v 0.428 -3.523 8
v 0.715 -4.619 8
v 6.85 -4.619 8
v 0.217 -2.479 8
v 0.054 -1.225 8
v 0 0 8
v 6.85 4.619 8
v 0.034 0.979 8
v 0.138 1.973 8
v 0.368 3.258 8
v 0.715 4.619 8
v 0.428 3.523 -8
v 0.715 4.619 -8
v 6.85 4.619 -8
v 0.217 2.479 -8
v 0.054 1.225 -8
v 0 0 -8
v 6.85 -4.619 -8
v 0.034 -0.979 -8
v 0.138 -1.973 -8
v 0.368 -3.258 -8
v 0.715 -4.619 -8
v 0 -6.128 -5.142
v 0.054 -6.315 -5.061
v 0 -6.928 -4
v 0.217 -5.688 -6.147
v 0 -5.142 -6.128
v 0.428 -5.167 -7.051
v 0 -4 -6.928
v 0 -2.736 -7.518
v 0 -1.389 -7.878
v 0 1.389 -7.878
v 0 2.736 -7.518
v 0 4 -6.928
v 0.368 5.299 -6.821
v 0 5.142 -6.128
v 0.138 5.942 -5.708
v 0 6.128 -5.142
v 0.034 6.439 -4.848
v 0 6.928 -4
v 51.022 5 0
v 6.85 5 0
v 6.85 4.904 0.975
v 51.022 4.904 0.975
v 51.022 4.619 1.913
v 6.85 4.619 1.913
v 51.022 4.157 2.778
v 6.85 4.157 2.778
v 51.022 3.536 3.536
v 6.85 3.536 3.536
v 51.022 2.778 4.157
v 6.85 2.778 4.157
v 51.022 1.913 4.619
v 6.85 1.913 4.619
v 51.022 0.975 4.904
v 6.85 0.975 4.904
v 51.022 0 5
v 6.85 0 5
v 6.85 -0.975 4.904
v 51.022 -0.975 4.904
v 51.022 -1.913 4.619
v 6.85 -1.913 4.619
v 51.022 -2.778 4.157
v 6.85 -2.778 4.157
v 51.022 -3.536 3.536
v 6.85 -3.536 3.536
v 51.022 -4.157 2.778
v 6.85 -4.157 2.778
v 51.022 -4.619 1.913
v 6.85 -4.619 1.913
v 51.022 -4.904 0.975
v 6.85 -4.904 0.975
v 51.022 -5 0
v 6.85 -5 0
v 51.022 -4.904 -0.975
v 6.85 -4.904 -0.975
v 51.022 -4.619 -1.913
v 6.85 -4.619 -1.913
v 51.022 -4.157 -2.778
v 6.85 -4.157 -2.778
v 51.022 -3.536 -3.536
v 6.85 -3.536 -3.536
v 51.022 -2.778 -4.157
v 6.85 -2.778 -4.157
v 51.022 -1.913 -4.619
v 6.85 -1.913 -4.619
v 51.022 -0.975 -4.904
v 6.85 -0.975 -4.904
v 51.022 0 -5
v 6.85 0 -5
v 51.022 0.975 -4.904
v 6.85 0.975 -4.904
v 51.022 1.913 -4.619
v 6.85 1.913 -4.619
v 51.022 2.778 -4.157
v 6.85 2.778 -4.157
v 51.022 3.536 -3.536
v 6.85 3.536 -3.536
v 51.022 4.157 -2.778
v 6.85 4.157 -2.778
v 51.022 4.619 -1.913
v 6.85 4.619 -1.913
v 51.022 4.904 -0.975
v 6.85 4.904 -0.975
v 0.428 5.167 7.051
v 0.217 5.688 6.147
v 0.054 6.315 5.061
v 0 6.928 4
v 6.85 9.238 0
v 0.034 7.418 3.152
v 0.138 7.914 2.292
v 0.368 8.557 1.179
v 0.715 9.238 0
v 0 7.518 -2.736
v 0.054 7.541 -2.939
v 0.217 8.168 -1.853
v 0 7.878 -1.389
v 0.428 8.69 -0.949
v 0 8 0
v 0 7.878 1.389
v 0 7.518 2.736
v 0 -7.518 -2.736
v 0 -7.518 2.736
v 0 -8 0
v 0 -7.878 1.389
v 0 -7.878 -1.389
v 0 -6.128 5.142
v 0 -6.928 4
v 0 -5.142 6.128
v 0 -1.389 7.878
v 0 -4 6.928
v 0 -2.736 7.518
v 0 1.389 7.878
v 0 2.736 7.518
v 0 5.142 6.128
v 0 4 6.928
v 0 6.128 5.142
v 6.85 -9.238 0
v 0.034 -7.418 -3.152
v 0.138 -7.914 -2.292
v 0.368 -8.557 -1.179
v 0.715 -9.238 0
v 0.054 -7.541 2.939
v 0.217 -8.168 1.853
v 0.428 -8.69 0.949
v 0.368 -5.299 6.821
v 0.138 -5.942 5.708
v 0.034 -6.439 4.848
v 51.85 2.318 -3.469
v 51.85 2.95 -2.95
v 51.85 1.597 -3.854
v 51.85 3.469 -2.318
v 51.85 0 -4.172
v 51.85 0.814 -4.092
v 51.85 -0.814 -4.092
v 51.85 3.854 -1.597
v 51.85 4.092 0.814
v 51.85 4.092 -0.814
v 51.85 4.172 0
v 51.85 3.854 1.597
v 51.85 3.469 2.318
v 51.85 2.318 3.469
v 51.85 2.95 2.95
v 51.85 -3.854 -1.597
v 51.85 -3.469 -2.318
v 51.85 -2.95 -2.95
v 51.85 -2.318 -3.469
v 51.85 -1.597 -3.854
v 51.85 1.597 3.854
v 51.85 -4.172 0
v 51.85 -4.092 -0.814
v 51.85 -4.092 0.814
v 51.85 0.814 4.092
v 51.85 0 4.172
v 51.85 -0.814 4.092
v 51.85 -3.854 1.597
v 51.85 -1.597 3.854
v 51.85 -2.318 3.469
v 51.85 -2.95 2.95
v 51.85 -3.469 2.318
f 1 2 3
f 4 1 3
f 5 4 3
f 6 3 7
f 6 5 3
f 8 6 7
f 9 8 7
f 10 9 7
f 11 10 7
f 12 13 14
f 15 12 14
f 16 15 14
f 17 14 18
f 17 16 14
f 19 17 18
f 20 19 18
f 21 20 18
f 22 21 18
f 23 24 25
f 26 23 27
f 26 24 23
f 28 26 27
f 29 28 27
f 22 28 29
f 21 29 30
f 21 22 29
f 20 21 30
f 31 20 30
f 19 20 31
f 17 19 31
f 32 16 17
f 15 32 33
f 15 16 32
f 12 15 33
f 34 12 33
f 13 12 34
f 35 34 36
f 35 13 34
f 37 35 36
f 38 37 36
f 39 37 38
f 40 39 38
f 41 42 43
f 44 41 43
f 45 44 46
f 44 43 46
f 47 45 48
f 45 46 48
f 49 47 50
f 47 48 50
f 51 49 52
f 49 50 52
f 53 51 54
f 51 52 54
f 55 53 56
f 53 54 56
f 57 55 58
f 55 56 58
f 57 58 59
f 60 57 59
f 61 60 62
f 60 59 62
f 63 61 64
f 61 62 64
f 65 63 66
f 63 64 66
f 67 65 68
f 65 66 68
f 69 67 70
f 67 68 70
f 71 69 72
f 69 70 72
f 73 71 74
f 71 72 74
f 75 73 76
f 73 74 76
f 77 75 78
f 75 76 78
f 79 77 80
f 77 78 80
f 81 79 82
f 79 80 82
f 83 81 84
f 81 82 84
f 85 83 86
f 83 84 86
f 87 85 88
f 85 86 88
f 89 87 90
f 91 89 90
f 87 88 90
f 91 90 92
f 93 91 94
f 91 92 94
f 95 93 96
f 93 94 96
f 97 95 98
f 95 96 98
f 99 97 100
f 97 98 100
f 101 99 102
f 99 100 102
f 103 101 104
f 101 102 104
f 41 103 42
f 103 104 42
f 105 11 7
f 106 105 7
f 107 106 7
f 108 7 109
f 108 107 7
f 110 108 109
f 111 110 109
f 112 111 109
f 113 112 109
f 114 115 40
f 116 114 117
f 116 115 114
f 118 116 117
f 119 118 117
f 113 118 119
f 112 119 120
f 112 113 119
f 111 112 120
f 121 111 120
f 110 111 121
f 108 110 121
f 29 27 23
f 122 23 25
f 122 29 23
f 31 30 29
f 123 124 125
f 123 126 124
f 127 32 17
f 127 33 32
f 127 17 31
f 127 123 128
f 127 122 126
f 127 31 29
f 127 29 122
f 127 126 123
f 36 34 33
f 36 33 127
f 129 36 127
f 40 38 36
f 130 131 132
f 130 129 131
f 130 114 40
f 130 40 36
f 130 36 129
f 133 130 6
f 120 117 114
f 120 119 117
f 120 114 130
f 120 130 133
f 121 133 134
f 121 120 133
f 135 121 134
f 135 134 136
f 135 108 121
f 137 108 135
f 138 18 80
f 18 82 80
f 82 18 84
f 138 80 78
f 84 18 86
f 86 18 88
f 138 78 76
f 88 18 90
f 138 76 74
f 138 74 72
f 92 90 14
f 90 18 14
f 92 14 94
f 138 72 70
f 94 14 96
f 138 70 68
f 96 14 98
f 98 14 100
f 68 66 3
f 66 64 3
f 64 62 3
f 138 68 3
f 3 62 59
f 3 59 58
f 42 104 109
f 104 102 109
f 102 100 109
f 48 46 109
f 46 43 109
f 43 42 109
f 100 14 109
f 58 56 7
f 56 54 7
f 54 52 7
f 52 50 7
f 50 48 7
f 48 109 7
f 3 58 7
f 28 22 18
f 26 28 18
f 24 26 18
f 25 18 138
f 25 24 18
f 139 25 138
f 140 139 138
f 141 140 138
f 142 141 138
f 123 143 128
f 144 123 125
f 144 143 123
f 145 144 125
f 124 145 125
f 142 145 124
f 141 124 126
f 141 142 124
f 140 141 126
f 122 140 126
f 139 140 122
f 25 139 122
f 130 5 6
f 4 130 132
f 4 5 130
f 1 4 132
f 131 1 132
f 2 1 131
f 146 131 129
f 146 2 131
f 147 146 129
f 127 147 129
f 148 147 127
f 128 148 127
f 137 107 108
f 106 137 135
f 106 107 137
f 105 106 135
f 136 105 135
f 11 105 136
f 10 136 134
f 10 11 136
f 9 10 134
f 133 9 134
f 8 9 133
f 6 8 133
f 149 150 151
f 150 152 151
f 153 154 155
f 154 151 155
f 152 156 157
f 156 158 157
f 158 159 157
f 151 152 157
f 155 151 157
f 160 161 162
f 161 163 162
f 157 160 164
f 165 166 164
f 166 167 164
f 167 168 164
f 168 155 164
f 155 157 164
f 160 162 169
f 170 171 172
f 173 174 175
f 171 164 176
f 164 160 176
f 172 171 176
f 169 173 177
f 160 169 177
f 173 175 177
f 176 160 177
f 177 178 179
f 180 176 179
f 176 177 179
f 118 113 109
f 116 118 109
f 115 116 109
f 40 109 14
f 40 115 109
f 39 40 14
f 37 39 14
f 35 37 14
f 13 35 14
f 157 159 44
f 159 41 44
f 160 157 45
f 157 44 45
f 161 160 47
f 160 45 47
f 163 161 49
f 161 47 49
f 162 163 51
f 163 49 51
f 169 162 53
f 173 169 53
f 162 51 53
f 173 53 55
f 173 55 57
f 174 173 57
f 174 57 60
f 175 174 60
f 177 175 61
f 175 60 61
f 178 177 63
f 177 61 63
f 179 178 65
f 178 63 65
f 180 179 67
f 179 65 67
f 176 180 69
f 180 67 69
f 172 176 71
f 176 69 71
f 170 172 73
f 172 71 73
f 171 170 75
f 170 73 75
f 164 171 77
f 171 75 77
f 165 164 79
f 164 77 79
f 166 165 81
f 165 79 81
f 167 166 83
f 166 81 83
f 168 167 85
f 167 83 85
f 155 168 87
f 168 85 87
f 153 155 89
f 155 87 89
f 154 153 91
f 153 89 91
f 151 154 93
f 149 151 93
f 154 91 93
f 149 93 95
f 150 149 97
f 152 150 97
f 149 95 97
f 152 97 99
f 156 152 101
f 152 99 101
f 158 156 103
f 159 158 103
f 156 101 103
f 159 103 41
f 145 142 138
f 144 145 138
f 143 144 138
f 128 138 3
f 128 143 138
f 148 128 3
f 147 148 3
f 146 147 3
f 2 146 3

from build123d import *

# Parameters (mm, degrees)
BASEHEAD_DEPTH = 6.85


with BuildPart() as part:
    # Sketch1 → BaseHead (new body)
    with BuildSketch(Plane(origin=(0, 0, 0), x_dir=(0, 0, -1), z_dir=(1, 0, 0))):
        Polygon((8, 4.618802154), (8, -4.618802154), (0, -9.237604307), (-8, -4.618802154), (-8, 4.618802154), (0, 9.237604307), align=None)
    extrude(amount=BASEHEAD_DEPTH)

    # BodySke → BaseBody (revolve)
    with BuildSketch(Plane.XY):
        Polygon((0, 0), (51.85, 0), (51.85, 4.172), (51.022, 5), (0, 5), align=None)
    revolve(axis=Axis((0, 0, 0), (1, 0, 0)))

    # Sketch3 → HeadChamfer (revolve, cut)
    with BuildSketch(Plane.XY):
        Polygon((0, 8), (3.601282526, 14.237604307), (3.601282526, 19.237604307), (-10, 19.237604307), (-10, 8), align=None)
    revolve(axis=Axis((0, 0, 0), (1, 0, 0)), mode=Mode.SUBTRACT)


solid = part.part
